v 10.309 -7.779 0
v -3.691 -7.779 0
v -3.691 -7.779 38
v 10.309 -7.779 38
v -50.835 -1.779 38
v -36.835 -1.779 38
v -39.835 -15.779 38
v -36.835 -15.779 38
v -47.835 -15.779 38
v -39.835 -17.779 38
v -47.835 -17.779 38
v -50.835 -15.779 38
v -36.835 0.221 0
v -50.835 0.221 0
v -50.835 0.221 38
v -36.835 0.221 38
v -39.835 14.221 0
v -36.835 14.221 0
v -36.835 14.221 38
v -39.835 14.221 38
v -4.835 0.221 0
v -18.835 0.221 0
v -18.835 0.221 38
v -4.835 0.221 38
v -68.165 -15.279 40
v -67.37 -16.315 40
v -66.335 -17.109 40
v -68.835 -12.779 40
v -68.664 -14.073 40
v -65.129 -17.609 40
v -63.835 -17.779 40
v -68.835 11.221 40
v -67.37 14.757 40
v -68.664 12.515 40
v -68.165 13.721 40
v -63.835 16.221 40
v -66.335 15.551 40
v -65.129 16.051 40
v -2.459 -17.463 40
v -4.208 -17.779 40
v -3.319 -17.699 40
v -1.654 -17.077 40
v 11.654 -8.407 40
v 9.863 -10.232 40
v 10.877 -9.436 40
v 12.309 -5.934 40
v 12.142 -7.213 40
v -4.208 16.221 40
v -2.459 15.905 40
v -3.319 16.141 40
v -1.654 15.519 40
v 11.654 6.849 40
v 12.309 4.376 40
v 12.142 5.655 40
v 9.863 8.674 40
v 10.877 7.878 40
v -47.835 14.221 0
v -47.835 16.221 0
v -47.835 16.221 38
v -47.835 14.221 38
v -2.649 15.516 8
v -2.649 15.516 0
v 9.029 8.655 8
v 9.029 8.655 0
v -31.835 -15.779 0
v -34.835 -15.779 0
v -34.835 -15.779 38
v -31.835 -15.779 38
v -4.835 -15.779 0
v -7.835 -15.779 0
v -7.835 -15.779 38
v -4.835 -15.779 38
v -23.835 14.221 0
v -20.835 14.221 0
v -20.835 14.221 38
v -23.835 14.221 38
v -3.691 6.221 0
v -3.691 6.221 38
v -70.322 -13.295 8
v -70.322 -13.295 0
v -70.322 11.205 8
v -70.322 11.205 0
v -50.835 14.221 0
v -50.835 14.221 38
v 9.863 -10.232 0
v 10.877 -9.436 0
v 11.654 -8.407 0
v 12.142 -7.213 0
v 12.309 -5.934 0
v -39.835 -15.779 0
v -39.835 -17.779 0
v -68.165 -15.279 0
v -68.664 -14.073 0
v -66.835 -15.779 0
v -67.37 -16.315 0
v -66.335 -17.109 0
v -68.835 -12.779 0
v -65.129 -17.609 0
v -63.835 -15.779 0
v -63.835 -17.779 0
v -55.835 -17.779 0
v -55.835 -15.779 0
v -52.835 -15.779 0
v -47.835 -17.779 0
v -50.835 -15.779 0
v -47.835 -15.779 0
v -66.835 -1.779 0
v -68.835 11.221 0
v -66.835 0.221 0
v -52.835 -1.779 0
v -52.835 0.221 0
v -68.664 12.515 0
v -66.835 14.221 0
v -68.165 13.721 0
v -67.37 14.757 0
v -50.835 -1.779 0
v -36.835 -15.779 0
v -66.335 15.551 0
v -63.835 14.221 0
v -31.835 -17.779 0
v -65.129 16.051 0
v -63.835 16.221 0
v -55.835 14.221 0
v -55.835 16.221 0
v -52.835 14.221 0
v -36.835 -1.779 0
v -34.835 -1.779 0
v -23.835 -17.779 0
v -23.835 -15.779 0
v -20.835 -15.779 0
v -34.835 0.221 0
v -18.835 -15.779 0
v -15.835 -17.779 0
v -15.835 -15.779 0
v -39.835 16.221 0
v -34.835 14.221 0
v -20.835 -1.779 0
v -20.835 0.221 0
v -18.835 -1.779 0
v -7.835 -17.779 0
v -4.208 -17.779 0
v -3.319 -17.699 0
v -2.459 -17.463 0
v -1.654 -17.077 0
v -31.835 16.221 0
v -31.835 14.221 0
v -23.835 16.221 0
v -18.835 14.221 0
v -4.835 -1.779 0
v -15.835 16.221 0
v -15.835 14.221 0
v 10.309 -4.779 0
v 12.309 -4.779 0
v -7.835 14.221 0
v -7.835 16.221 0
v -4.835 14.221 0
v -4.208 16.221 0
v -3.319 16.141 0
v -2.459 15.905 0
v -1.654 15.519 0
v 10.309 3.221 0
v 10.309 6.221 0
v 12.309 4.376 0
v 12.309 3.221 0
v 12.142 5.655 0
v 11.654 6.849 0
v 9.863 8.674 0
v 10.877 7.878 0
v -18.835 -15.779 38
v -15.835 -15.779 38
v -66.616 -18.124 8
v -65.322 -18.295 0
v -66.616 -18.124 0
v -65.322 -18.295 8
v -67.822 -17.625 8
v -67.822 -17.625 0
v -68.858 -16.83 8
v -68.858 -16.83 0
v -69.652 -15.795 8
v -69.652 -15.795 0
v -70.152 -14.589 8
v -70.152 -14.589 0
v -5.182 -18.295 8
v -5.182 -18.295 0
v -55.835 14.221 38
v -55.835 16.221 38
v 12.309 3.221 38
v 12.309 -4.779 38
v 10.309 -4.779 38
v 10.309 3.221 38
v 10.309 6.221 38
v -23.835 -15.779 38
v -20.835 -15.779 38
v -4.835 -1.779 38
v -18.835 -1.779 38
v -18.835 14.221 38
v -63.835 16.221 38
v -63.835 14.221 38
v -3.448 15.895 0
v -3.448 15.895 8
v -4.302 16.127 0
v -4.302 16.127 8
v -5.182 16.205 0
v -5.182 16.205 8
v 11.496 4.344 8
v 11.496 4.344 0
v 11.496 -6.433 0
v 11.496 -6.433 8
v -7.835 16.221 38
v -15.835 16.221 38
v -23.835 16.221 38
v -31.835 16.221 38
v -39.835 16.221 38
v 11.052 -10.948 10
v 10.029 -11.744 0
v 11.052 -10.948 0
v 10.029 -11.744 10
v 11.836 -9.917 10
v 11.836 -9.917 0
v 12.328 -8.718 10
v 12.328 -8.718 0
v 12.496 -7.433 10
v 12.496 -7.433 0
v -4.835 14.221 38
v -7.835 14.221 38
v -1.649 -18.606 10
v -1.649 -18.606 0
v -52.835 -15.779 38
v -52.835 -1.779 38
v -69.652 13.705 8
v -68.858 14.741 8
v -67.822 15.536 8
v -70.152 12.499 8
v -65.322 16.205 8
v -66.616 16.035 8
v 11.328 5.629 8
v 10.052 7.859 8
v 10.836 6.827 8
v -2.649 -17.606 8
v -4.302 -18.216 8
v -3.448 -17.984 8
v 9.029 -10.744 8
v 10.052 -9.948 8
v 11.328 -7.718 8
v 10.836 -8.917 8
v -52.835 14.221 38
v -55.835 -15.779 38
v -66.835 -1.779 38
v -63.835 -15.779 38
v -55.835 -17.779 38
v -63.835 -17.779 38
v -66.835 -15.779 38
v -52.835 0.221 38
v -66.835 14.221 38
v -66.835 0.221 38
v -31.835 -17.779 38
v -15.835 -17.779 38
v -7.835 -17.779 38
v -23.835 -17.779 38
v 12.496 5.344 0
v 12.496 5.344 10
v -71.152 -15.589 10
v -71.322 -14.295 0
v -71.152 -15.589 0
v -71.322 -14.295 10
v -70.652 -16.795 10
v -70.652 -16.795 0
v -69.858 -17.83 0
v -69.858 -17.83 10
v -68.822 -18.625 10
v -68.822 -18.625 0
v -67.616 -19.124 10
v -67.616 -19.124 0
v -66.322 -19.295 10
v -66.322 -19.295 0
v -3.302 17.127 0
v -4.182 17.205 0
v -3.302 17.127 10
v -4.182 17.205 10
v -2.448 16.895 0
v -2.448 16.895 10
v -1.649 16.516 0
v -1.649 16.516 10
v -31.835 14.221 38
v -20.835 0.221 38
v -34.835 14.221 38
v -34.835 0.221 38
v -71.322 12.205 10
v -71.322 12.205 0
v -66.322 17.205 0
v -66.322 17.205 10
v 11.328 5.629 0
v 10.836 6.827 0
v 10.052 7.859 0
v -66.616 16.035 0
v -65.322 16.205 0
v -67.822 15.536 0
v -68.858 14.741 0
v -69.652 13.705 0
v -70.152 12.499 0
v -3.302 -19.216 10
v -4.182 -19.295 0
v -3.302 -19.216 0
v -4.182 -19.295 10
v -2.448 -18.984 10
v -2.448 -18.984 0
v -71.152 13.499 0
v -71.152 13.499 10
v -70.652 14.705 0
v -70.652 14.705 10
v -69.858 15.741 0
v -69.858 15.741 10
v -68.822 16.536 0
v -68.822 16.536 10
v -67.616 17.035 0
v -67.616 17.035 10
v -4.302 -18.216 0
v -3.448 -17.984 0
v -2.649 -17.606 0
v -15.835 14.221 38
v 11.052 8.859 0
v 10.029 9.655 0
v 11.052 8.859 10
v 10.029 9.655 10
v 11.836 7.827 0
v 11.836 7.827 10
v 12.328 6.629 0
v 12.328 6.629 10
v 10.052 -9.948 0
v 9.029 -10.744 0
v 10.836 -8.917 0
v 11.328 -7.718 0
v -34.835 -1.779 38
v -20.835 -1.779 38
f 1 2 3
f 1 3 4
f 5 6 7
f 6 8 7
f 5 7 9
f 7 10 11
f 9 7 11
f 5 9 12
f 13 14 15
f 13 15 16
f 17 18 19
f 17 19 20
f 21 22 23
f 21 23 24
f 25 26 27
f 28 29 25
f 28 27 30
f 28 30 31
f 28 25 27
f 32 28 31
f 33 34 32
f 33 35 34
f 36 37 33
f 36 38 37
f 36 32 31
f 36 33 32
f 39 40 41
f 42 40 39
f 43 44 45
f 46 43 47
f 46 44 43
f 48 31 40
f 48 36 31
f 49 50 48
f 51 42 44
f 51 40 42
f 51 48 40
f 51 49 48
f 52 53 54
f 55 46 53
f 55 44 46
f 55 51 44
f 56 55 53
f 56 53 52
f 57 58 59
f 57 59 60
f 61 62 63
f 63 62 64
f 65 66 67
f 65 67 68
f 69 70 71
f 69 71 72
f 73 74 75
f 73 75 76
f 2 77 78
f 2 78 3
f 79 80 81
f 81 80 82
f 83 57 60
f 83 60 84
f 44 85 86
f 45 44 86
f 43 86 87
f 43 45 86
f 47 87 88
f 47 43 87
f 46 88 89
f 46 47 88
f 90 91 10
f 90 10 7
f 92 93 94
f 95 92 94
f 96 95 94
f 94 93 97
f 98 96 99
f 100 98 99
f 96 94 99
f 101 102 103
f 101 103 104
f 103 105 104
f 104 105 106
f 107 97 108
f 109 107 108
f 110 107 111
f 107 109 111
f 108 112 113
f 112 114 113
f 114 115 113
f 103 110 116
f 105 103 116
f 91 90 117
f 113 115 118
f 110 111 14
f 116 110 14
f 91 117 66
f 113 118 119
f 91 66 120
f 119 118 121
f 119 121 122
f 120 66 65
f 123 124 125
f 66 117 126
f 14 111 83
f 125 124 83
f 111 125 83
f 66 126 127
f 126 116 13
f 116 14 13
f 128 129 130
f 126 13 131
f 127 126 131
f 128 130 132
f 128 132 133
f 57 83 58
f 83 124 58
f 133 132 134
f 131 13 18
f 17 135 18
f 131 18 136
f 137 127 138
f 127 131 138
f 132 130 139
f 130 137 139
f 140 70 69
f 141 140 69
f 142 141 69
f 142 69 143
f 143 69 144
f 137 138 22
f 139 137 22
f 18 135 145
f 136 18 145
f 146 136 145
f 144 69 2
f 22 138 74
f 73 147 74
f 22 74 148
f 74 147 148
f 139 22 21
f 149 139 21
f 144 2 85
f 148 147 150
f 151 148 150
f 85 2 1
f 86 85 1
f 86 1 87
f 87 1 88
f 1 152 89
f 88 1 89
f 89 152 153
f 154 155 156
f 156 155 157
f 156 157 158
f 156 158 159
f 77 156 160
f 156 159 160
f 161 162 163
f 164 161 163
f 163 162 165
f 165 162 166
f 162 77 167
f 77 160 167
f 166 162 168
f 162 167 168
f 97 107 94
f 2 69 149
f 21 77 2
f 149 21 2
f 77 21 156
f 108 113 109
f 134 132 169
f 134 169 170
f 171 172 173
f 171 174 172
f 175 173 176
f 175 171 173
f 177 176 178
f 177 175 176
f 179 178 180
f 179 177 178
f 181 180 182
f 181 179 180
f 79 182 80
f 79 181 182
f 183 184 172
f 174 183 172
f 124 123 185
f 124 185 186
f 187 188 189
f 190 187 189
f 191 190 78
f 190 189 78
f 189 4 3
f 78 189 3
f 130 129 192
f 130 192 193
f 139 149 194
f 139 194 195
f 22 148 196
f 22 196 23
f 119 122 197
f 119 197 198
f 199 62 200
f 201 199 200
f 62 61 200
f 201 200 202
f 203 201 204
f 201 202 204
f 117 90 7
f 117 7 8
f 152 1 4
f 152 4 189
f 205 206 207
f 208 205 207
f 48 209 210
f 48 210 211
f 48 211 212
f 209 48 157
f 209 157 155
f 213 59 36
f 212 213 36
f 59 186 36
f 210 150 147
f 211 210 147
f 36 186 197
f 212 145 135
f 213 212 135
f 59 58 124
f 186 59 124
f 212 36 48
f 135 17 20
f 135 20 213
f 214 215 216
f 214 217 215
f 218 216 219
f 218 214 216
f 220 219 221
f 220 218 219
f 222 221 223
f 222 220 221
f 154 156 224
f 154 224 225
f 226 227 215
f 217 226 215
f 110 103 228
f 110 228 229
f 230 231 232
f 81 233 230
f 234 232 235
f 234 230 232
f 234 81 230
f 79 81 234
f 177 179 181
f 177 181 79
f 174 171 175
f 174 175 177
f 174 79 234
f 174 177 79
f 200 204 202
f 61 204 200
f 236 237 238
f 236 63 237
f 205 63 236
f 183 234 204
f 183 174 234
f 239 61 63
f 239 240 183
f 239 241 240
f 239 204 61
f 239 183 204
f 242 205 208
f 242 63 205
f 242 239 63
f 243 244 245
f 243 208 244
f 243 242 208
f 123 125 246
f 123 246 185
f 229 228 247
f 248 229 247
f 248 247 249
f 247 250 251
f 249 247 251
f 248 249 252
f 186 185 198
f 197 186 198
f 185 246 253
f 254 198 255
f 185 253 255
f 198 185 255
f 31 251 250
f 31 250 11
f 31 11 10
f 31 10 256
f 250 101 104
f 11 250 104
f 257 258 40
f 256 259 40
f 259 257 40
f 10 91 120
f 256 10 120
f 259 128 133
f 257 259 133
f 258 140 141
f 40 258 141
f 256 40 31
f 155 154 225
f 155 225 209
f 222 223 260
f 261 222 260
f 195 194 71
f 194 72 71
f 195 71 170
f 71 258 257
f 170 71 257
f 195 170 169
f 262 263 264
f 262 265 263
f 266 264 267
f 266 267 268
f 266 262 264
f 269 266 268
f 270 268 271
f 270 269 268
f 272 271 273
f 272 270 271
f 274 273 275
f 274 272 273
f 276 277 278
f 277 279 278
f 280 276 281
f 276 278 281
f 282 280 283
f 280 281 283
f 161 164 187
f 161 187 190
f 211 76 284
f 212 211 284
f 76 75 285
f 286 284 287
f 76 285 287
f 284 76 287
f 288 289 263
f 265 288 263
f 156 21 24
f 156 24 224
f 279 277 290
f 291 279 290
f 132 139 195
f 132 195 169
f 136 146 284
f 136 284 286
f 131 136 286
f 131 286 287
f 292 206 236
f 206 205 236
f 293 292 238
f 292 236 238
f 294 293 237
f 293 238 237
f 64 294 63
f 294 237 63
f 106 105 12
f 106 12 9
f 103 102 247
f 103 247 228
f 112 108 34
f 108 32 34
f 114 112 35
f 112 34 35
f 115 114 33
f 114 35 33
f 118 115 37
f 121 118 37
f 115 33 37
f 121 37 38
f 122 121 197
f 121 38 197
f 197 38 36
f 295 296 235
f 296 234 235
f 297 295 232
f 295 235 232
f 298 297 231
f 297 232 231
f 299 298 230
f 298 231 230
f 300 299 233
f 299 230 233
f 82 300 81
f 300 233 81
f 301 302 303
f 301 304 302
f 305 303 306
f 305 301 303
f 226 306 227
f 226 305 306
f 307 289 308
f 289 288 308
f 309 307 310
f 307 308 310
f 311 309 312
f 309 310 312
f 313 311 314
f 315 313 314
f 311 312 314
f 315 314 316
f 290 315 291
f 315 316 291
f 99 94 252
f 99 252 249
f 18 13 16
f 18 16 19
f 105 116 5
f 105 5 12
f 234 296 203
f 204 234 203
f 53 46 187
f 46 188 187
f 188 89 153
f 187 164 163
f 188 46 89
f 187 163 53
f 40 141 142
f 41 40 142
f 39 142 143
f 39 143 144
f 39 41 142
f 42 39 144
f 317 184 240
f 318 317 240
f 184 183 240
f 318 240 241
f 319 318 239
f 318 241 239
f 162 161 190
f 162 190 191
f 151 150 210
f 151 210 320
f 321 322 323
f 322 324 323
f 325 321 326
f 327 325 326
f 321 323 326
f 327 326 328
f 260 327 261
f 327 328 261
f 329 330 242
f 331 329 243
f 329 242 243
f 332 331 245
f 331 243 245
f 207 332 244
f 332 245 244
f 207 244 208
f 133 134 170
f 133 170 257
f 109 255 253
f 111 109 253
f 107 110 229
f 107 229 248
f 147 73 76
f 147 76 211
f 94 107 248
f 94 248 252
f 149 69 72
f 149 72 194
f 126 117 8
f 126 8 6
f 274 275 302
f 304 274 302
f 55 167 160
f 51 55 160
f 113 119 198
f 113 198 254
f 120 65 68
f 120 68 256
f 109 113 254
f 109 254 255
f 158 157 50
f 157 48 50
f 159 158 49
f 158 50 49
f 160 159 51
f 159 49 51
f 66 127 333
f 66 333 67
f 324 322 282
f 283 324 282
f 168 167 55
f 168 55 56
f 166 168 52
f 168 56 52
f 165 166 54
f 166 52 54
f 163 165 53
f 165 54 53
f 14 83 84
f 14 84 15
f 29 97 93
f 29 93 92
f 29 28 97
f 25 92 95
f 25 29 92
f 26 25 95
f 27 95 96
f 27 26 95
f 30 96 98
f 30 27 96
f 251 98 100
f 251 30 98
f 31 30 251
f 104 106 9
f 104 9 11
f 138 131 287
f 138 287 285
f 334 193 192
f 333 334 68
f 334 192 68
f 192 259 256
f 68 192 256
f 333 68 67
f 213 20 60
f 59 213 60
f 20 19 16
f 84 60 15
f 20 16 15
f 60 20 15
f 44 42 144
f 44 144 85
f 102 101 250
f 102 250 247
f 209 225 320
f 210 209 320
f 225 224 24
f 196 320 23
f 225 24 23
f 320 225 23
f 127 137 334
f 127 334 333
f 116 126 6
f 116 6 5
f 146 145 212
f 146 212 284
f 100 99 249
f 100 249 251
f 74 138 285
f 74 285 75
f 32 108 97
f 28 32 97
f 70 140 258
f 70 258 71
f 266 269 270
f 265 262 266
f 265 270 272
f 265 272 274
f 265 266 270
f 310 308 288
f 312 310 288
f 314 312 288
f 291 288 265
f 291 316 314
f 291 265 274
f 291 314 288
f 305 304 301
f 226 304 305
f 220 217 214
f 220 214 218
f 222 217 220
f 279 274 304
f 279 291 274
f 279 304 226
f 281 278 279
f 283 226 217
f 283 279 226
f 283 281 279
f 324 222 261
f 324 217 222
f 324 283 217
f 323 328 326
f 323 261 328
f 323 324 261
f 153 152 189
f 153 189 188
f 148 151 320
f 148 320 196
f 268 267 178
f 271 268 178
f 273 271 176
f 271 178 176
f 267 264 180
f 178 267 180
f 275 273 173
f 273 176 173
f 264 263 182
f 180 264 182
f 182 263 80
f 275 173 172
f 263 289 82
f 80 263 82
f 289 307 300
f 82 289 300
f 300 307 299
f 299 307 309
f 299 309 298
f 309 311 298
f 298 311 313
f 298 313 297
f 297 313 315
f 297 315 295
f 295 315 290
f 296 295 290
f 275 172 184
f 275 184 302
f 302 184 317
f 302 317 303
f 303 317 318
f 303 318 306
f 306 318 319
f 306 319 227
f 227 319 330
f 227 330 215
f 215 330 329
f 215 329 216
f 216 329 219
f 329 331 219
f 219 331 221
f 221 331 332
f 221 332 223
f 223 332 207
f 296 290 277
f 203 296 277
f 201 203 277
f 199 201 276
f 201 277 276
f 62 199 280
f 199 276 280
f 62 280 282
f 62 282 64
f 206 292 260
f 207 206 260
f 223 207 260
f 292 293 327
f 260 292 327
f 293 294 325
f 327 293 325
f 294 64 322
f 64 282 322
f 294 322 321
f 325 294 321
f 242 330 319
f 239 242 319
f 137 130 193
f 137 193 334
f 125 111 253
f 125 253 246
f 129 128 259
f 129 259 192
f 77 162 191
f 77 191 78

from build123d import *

# Parameters (mm, degrees)
PAD_DEPTH       = 40
POCKET_DEPTH    = 38
FILLET_R        = 5
PAD001_DEPTH    = 10
POCKET001_DEPTH = 8
FILLET001_R     = 5
FILLET002_R     = 5


with BuildPart() as fillet_body:
    # Sketch → Pad (new body)
    with BuildSketch(Plane.XY):
        Polygon((-68.834577, 16.221011), (-68.834577, -17.778989), (-2.834577, -17.778989), (12.308523, -8.778989), (12.308523, 7.221011), (-2.834577, 16.221011), align=None)
    extrude(amount=PAD_DEPTH)

    # Sketch001 → Pocket (cut)
    with BuildSketch(Plane(origin=(0, 0, 0), x_dir=(1, 0, 0), z_dir=(0, 0, -1))):
        Polygon((-52.834577, 15.778989), (-52.834577, 1.778989), (-66.834577, 1.778989), (-66.834577, 15.778989), (-63.834577, 15.778989), (-63.834577, 17.778989), (-55.834577, 17.778989), (-55.834577, 15.778989), align=None)
        Polygon((-66.834577, -0.221011), (-52.834577, -0.221011), (-52.834577, -14.221011), (-55.834577, -14.221011), (-55.834577, -16.221011), (-63.834577, -16.221011), (-63.834577, -14.221011), (-66.834577, -14.221011), align=None)
        Polygon((-36.834577, 1.778989), (-50.834577, 1.778989), (-50.834577, 15.778989), (-47.834577, 15.778989), (-47.834577, 17.778989), (-39.834577, 17.778989), (-39.834577, 15.778989), (-36.834577, 15.778989), align=None)
        Polygon((-36.834577, -0.221011), (-36.834577, -14.221011), (-39.834577, -14.221011), (-39.834577, -16.221011), (-47.834577, -16.221011), (-47.834577, -14.221011), (-50.834577, -14.221011), (-50.834577, -0.221011), align=None)
        Polygon((-20.834577, 15.778989), (-20.834577, 1.778989), (-34.834577, 1.778989), (-34.834577, 15.778989), (-31.834577, 15.778989), (-31.834577, 17.778989), (-23.834577, 17.778989), (-23.834577, 15.778989), align=None)
        Polygon((-20.834577, -0.221011), (-20.834577, -14.221011), (-23.834577, -14.221011), (-23.834577, -16.221011), (-31.834577, -16.221011), (-31.834577, -14.221011), (-34.834577, -14.221011), (-34.834577, -0.221011), align=None)
        Polygon((-4.834577, 1.778989), (-18.834577, 1.778989), (-18.834577, 15.778989), (-15.834577, 15.778989), (-15.834577, 17.778989), (-7.834577, 17.778989), (-7.834577, 15.778989), (-4.834577, 15.778989), align=None)
        Polygon((-4.834577, -0.221011), (-4.834577, -14.221011), (-7.834577, -14.221011), (-7.834577, -16.221011), (-15.834577, -16.221011), (-15.834577, -14.221011), (-18.834577, -14.221011), (-18.834577, -0.221011), align=None)
        Polygon((10.308523, -6.221011), (-3.691477, -6.221011), (-3.691477, 7.778989), (10.308523, 7.778989), (10.308523, 4.778989), (12.308523, 4.778989), (12.308523, -3.221011), (10.308523, -3.221011), align=None)
    extrude(amount=-POCKET_DEPTH, mode=Mode.SUBTRACT)

    # Fillet
    fillet_edges = [fillet_body.edges().sort_by_distance(p)[0] for p in [
        (12.308523, 7.221011, 20),
        (-2.834577, 16.221011, 20),
        (-68.834577, 16.221011, 20),
        (12.308523, -8.778989, 20),
        (-2.834577, -17.778989, 20),
        (-68.834577, -17.778989, 20),
    ]]
    fillet(fillet_edges, radius=FILLET_R)


with BuildPart() as fillet002:
    # Sketch002 → Pad001 (new body)
    with BuildSketch(Plane.XY):
        Polygon((-71.322112, 17.205377), (-71.322112, -19.294623), (-2.822112, -19.294623), (12.496079, -10.294623), (12.496079, 8.205377), (-2.822112, 17.205377), align=None)
    extrude(amount=PAD001_DEPTH)

    # Sketch003 → Pocket001 (cut)
    with BuildSketch(Plane(origin=(0, 0, 0), x_dir=(1, 0, 0), z_dir=(0, 0, -1))):
        Polygon((-70.322112, 18.294623), (-70.322112, -16.205377), (-3.822112, -16.205377), (11.496079, -7.205377), (11.496079, 9.294623), (-3.822112, 18.294623), align=None)
    extrude(amount=-POCKET001_DEPTH, mode=Mode.SUBTRACT)

    # Fillet001
    fillet001_edges = [fillet002.edges().sort_by_distance(p)[0] for p in [
        (11.496079, -9.294623, 4),
        (11.496079, 7.205377, 4),
        (-3.822112, 16.205377, 4),
        (-3.822112, -18.294623, 4),
        (-70.322112, -18.294623, 4),
        (-70.322112, 16.205377, 4),
    ]]
    fillet(fillet001_edges, radius=FILLET001_R)

    # Fillet002
    fillet002_edges = [fillet002.edges().sort_by_distance(p)[0] for p in [
        (-71.322112, 17.205377, 5),
        (-71.322112, -19.294623, 5),
        (-2.822112, 17.205377, 5),
        (12.496079, 8.205377, 5),
        (12.496079, -10.294623, 5),
        (-2.822112, -19.294623, 5),
    ]]
    fillet(fillet002_edges, radius=FILLET002_R)


solid = Compound([fillet_body.part, fillet002.part])
